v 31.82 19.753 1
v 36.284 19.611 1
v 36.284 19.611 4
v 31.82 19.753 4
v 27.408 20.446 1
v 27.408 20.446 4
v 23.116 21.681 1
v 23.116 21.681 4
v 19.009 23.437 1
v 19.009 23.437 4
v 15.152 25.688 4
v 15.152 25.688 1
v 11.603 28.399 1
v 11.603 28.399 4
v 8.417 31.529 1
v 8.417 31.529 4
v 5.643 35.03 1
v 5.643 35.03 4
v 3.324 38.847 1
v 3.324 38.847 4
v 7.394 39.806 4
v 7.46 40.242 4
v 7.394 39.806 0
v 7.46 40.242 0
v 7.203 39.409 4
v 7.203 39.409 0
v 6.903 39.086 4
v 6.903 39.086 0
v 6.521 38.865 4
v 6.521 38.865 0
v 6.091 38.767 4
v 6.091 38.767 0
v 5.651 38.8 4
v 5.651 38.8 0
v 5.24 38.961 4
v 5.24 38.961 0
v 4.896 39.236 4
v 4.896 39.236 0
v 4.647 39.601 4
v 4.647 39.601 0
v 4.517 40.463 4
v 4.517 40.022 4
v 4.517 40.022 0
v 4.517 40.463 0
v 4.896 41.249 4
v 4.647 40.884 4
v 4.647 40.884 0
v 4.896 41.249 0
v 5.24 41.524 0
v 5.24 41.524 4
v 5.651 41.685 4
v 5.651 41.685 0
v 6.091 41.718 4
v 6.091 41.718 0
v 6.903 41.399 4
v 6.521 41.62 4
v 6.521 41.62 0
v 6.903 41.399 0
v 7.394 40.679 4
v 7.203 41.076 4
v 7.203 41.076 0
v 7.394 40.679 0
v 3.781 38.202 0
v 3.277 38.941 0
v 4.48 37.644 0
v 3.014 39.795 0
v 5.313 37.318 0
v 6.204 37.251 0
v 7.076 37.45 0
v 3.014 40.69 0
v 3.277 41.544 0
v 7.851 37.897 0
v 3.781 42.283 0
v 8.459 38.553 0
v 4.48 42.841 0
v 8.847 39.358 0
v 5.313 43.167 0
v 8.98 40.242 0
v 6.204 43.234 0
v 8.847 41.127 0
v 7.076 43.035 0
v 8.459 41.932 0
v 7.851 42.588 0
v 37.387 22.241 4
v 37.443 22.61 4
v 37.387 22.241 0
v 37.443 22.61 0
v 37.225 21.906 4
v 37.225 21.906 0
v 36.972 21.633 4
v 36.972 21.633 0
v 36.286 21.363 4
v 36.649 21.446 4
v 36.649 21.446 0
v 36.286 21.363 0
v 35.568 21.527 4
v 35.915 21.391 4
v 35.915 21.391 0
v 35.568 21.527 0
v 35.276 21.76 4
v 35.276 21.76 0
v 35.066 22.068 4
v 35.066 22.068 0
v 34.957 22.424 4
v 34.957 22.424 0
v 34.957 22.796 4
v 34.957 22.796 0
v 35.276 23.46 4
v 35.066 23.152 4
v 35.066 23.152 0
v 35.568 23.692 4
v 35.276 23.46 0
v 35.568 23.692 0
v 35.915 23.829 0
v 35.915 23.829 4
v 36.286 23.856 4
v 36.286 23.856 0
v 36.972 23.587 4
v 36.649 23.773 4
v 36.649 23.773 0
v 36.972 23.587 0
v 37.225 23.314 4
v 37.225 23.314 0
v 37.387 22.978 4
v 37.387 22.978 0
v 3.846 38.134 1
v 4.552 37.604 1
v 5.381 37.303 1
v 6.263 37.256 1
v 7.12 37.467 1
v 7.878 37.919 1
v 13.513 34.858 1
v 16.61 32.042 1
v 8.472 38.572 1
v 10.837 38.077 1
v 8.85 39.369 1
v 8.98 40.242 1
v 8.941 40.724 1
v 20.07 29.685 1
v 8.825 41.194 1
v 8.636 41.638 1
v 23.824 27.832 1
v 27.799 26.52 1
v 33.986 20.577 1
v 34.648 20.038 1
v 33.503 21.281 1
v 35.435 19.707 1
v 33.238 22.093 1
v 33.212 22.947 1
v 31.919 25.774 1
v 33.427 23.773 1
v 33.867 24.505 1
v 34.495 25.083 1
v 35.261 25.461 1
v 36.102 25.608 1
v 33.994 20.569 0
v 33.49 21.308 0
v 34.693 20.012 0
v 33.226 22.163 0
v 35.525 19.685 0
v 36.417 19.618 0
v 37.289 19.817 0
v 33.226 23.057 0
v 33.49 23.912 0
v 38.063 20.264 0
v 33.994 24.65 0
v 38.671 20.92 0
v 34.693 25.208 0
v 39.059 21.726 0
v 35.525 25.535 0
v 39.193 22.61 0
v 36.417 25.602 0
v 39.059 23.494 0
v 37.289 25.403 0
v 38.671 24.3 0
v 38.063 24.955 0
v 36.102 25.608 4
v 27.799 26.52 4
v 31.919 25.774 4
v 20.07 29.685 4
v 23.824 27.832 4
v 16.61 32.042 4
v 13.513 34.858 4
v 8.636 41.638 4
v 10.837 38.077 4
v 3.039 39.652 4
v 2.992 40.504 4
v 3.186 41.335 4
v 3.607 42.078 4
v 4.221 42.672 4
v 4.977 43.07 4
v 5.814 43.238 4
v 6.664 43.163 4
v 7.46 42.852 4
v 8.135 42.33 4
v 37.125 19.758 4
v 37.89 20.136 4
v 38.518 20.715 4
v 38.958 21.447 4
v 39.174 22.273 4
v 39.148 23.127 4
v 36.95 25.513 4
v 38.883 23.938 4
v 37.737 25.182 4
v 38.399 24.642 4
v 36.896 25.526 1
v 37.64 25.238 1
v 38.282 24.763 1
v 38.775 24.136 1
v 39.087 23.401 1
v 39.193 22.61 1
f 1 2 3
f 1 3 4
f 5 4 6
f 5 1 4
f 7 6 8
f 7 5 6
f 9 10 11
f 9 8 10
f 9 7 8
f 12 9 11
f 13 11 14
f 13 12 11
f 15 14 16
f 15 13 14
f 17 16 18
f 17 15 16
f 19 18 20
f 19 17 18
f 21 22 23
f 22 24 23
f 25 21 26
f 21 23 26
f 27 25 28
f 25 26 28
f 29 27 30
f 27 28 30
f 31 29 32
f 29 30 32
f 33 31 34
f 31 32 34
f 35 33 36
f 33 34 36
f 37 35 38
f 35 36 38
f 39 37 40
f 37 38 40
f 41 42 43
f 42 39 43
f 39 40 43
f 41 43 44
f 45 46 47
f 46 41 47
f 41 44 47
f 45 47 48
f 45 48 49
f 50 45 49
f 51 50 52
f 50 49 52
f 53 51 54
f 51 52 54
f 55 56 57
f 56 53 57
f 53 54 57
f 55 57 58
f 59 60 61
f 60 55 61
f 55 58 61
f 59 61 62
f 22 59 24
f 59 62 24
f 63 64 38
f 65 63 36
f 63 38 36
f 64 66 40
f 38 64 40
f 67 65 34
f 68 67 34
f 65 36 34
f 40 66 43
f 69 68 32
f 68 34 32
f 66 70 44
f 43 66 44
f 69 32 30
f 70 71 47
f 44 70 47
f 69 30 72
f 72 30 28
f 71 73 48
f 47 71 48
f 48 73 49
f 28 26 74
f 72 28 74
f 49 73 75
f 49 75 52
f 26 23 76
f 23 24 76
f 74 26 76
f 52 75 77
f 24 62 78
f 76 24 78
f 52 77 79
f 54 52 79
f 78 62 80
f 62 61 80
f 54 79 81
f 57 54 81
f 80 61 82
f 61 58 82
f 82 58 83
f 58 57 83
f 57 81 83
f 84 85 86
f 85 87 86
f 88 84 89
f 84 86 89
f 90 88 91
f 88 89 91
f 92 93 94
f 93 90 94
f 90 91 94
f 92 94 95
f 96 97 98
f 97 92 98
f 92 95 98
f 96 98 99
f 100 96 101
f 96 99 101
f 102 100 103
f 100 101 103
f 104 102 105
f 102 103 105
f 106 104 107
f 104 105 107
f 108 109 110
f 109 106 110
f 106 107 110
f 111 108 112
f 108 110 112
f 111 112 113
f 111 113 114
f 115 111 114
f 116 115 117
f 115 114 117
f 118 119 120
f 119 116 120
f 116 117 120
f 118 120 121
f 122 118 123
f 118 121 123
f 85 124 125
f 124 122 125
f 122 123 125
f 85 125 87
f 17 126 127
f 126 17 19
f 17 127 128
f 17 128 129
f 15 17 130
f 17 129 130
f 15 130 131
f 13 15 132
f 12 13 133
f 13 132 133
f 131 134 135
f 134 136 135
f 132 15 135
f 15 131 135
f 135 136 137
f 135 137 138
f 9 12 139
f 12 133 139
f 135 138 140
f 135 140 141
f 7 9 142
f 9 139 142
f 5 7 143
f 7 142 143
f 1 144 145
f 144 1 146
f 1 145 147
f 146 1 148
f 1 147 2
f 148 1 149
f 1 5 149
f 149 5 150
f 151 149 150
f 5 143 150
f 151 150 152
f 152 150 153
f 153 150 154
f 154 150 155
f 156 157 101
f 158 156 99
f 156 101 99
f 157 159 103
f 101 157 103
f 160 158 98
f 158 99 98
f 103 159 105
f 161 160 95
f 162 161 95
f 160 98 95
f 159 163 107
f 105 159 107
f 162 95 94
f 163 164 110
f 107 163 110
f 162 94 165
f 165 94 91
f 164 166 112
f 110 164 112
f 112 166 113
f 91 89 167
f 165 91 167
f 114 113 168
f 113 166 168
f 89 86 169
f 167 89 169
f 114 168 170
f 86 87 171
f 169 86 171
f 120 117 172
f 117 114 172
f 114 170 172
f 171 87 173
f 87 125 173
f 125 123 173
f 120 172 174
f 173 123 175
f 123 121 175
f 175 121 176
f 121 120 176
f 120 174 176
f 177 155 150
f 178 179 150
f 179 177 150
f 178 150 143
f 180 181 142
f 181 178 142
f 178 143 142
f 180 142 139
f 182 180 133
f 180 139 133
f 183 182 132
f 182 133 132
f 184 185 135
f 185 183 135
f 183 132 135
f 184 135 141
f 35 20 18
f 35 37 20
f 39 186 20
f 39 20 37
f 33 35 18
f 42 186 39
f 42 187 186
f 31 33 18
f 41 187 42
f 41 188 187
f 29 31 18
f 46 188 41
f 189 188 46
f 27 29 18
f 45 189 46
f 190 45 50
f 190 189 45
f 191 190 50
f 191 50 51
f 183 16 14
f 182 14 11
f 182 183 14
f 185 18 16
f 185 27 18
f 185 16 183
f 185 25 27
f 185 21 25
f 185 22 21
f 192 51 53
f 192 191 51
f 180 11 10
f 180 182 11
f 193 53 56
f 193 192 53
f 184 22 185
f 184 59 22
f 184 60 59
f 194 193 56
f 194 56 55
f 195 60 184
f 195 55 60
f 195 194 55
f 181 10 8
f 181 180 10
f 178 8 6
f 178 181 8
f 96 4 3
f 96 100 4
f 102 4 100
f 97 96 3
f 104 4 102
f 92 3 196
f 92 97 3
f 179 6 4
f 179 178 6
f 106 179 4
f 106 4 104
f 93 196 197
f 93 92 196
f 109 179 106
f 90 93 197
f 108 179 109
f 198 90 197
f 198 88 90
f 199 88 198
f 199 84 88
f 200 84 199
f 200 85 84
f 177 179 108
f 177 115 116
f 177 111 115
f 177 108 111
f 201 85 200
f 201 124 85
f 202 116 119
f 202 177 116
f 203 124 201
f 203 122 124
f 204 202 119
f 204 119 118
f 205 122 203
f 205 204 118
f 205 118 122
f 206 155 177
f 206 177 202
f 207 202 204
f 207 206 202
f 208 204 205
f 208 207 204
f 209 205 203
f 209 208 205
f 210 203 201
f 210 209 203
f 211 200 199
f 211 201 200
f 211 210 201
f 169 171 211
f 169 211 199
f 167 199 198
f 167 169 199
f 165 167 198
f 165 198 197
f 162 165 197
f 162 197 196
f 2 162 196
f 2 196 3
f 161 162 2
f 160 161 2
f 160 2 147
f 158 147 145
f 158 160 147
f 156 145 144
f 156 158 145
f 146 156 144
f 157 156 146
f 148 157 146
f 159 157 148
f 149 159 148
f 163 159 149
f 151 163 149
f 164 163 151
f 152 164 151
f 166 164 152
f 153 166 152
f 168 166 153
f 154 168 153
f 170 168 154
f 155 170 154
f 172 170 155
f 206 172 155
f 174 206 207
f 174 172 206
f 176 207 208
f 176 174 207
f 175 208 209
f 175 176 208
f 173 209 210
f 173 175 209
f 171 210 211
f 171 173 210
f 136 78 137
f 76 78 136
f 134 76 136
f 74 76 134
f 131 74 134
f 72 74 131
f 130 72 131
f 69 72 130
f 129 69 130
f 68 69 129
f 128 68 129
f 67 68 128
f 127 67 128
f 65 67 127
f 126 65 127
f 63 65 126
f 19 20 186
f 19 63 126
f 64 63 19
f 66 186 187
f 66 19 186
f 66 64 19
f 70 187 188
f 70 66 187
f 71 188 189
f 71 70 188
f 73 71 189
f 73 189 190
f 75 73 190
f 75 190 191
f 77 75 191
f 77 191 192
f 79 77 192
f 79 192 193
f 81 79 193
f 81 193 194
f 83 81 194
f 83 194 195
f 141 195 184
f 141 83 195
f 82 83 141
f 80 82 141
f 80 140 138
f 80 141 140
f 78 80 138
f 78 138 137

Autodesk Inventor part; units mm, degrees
ref_plane "YZ Plane" through (0, 0, 0) normal (1, 0, 0) x (0, 1, 0)
ref_plane "XZ Plane" through (0, 0, 0) normal (0, 1, 0) x (-1, 0, 0)
ref_plane "XY Plane" through (0, 0, 0) normal (0, 0, 1) x (1, 0, 0)
sketch "Sketch1" plane through (0, 0, 0) normal (0, 0, 1) x (1, 0, 0)
  circle A0 centre (36.1927, 22.6099) radius 1.25 projected
  circle A1 centre (36.1927, 22.6099) radius 3
  circle A2 centre (5.9801, 40.2425) radius 1.4795 projected
  circle A3 centre (5.9801, 40.2425) radius 3
  point P0 (0, 0)
  dimension "d9" = 6
extrude "Extrusion1" add sketch "Sketch1" along normal blind 1
sketch "Sketch5" plane through (5.9801, 40.2425, 1) normal (0, 0, 1) x (1, 0, 0)
  circle A0 centre (0, 0) radius 3 projected
  circle A1 centre (0, 0) radius 1.4795 projected
  circle A2 centre (30.2126, -17.6326) radius 3 projected
  circle A3 centre (30.2126, -17.6326) radius 1.25 projected
  arc A4 (0, 0) -> (30.2126, -17.6326) centre (29.2115, 15.3522) ccw construction
  arc A5 (-2.6556, -1.3957) -> (30.3036, -20.6312) centre (29.2115, 15.3522) ccw
  arc A6 (2.6556, 1.3957) -> (30.1216, -14.634) centre (29.2115, 15.3522) ccw
  arc A7 (2.6556, 1.3957) -> (-2.6556, -1.3957) centre (0, 0) ccw
  arc A8 (30.3036, -20.6312) -> (30.1216, -14.634) centre (30.2126, -17.6326) ccw
  circle A9 centre (30.2126, -17.6326) radius 3 projected
  point P0 (-5.9801, -40.2425)
  point P1 (30.1216, -14.634)
  point P2 (2.6556, 1.3957)
  point P3 (-2.6556, -1.3957)
  point P4 (30.3036, -20.6312)
  dimension "d10" = 30
extrude "Extrusion4" add sketch "Sketch5" along normal blind 3
